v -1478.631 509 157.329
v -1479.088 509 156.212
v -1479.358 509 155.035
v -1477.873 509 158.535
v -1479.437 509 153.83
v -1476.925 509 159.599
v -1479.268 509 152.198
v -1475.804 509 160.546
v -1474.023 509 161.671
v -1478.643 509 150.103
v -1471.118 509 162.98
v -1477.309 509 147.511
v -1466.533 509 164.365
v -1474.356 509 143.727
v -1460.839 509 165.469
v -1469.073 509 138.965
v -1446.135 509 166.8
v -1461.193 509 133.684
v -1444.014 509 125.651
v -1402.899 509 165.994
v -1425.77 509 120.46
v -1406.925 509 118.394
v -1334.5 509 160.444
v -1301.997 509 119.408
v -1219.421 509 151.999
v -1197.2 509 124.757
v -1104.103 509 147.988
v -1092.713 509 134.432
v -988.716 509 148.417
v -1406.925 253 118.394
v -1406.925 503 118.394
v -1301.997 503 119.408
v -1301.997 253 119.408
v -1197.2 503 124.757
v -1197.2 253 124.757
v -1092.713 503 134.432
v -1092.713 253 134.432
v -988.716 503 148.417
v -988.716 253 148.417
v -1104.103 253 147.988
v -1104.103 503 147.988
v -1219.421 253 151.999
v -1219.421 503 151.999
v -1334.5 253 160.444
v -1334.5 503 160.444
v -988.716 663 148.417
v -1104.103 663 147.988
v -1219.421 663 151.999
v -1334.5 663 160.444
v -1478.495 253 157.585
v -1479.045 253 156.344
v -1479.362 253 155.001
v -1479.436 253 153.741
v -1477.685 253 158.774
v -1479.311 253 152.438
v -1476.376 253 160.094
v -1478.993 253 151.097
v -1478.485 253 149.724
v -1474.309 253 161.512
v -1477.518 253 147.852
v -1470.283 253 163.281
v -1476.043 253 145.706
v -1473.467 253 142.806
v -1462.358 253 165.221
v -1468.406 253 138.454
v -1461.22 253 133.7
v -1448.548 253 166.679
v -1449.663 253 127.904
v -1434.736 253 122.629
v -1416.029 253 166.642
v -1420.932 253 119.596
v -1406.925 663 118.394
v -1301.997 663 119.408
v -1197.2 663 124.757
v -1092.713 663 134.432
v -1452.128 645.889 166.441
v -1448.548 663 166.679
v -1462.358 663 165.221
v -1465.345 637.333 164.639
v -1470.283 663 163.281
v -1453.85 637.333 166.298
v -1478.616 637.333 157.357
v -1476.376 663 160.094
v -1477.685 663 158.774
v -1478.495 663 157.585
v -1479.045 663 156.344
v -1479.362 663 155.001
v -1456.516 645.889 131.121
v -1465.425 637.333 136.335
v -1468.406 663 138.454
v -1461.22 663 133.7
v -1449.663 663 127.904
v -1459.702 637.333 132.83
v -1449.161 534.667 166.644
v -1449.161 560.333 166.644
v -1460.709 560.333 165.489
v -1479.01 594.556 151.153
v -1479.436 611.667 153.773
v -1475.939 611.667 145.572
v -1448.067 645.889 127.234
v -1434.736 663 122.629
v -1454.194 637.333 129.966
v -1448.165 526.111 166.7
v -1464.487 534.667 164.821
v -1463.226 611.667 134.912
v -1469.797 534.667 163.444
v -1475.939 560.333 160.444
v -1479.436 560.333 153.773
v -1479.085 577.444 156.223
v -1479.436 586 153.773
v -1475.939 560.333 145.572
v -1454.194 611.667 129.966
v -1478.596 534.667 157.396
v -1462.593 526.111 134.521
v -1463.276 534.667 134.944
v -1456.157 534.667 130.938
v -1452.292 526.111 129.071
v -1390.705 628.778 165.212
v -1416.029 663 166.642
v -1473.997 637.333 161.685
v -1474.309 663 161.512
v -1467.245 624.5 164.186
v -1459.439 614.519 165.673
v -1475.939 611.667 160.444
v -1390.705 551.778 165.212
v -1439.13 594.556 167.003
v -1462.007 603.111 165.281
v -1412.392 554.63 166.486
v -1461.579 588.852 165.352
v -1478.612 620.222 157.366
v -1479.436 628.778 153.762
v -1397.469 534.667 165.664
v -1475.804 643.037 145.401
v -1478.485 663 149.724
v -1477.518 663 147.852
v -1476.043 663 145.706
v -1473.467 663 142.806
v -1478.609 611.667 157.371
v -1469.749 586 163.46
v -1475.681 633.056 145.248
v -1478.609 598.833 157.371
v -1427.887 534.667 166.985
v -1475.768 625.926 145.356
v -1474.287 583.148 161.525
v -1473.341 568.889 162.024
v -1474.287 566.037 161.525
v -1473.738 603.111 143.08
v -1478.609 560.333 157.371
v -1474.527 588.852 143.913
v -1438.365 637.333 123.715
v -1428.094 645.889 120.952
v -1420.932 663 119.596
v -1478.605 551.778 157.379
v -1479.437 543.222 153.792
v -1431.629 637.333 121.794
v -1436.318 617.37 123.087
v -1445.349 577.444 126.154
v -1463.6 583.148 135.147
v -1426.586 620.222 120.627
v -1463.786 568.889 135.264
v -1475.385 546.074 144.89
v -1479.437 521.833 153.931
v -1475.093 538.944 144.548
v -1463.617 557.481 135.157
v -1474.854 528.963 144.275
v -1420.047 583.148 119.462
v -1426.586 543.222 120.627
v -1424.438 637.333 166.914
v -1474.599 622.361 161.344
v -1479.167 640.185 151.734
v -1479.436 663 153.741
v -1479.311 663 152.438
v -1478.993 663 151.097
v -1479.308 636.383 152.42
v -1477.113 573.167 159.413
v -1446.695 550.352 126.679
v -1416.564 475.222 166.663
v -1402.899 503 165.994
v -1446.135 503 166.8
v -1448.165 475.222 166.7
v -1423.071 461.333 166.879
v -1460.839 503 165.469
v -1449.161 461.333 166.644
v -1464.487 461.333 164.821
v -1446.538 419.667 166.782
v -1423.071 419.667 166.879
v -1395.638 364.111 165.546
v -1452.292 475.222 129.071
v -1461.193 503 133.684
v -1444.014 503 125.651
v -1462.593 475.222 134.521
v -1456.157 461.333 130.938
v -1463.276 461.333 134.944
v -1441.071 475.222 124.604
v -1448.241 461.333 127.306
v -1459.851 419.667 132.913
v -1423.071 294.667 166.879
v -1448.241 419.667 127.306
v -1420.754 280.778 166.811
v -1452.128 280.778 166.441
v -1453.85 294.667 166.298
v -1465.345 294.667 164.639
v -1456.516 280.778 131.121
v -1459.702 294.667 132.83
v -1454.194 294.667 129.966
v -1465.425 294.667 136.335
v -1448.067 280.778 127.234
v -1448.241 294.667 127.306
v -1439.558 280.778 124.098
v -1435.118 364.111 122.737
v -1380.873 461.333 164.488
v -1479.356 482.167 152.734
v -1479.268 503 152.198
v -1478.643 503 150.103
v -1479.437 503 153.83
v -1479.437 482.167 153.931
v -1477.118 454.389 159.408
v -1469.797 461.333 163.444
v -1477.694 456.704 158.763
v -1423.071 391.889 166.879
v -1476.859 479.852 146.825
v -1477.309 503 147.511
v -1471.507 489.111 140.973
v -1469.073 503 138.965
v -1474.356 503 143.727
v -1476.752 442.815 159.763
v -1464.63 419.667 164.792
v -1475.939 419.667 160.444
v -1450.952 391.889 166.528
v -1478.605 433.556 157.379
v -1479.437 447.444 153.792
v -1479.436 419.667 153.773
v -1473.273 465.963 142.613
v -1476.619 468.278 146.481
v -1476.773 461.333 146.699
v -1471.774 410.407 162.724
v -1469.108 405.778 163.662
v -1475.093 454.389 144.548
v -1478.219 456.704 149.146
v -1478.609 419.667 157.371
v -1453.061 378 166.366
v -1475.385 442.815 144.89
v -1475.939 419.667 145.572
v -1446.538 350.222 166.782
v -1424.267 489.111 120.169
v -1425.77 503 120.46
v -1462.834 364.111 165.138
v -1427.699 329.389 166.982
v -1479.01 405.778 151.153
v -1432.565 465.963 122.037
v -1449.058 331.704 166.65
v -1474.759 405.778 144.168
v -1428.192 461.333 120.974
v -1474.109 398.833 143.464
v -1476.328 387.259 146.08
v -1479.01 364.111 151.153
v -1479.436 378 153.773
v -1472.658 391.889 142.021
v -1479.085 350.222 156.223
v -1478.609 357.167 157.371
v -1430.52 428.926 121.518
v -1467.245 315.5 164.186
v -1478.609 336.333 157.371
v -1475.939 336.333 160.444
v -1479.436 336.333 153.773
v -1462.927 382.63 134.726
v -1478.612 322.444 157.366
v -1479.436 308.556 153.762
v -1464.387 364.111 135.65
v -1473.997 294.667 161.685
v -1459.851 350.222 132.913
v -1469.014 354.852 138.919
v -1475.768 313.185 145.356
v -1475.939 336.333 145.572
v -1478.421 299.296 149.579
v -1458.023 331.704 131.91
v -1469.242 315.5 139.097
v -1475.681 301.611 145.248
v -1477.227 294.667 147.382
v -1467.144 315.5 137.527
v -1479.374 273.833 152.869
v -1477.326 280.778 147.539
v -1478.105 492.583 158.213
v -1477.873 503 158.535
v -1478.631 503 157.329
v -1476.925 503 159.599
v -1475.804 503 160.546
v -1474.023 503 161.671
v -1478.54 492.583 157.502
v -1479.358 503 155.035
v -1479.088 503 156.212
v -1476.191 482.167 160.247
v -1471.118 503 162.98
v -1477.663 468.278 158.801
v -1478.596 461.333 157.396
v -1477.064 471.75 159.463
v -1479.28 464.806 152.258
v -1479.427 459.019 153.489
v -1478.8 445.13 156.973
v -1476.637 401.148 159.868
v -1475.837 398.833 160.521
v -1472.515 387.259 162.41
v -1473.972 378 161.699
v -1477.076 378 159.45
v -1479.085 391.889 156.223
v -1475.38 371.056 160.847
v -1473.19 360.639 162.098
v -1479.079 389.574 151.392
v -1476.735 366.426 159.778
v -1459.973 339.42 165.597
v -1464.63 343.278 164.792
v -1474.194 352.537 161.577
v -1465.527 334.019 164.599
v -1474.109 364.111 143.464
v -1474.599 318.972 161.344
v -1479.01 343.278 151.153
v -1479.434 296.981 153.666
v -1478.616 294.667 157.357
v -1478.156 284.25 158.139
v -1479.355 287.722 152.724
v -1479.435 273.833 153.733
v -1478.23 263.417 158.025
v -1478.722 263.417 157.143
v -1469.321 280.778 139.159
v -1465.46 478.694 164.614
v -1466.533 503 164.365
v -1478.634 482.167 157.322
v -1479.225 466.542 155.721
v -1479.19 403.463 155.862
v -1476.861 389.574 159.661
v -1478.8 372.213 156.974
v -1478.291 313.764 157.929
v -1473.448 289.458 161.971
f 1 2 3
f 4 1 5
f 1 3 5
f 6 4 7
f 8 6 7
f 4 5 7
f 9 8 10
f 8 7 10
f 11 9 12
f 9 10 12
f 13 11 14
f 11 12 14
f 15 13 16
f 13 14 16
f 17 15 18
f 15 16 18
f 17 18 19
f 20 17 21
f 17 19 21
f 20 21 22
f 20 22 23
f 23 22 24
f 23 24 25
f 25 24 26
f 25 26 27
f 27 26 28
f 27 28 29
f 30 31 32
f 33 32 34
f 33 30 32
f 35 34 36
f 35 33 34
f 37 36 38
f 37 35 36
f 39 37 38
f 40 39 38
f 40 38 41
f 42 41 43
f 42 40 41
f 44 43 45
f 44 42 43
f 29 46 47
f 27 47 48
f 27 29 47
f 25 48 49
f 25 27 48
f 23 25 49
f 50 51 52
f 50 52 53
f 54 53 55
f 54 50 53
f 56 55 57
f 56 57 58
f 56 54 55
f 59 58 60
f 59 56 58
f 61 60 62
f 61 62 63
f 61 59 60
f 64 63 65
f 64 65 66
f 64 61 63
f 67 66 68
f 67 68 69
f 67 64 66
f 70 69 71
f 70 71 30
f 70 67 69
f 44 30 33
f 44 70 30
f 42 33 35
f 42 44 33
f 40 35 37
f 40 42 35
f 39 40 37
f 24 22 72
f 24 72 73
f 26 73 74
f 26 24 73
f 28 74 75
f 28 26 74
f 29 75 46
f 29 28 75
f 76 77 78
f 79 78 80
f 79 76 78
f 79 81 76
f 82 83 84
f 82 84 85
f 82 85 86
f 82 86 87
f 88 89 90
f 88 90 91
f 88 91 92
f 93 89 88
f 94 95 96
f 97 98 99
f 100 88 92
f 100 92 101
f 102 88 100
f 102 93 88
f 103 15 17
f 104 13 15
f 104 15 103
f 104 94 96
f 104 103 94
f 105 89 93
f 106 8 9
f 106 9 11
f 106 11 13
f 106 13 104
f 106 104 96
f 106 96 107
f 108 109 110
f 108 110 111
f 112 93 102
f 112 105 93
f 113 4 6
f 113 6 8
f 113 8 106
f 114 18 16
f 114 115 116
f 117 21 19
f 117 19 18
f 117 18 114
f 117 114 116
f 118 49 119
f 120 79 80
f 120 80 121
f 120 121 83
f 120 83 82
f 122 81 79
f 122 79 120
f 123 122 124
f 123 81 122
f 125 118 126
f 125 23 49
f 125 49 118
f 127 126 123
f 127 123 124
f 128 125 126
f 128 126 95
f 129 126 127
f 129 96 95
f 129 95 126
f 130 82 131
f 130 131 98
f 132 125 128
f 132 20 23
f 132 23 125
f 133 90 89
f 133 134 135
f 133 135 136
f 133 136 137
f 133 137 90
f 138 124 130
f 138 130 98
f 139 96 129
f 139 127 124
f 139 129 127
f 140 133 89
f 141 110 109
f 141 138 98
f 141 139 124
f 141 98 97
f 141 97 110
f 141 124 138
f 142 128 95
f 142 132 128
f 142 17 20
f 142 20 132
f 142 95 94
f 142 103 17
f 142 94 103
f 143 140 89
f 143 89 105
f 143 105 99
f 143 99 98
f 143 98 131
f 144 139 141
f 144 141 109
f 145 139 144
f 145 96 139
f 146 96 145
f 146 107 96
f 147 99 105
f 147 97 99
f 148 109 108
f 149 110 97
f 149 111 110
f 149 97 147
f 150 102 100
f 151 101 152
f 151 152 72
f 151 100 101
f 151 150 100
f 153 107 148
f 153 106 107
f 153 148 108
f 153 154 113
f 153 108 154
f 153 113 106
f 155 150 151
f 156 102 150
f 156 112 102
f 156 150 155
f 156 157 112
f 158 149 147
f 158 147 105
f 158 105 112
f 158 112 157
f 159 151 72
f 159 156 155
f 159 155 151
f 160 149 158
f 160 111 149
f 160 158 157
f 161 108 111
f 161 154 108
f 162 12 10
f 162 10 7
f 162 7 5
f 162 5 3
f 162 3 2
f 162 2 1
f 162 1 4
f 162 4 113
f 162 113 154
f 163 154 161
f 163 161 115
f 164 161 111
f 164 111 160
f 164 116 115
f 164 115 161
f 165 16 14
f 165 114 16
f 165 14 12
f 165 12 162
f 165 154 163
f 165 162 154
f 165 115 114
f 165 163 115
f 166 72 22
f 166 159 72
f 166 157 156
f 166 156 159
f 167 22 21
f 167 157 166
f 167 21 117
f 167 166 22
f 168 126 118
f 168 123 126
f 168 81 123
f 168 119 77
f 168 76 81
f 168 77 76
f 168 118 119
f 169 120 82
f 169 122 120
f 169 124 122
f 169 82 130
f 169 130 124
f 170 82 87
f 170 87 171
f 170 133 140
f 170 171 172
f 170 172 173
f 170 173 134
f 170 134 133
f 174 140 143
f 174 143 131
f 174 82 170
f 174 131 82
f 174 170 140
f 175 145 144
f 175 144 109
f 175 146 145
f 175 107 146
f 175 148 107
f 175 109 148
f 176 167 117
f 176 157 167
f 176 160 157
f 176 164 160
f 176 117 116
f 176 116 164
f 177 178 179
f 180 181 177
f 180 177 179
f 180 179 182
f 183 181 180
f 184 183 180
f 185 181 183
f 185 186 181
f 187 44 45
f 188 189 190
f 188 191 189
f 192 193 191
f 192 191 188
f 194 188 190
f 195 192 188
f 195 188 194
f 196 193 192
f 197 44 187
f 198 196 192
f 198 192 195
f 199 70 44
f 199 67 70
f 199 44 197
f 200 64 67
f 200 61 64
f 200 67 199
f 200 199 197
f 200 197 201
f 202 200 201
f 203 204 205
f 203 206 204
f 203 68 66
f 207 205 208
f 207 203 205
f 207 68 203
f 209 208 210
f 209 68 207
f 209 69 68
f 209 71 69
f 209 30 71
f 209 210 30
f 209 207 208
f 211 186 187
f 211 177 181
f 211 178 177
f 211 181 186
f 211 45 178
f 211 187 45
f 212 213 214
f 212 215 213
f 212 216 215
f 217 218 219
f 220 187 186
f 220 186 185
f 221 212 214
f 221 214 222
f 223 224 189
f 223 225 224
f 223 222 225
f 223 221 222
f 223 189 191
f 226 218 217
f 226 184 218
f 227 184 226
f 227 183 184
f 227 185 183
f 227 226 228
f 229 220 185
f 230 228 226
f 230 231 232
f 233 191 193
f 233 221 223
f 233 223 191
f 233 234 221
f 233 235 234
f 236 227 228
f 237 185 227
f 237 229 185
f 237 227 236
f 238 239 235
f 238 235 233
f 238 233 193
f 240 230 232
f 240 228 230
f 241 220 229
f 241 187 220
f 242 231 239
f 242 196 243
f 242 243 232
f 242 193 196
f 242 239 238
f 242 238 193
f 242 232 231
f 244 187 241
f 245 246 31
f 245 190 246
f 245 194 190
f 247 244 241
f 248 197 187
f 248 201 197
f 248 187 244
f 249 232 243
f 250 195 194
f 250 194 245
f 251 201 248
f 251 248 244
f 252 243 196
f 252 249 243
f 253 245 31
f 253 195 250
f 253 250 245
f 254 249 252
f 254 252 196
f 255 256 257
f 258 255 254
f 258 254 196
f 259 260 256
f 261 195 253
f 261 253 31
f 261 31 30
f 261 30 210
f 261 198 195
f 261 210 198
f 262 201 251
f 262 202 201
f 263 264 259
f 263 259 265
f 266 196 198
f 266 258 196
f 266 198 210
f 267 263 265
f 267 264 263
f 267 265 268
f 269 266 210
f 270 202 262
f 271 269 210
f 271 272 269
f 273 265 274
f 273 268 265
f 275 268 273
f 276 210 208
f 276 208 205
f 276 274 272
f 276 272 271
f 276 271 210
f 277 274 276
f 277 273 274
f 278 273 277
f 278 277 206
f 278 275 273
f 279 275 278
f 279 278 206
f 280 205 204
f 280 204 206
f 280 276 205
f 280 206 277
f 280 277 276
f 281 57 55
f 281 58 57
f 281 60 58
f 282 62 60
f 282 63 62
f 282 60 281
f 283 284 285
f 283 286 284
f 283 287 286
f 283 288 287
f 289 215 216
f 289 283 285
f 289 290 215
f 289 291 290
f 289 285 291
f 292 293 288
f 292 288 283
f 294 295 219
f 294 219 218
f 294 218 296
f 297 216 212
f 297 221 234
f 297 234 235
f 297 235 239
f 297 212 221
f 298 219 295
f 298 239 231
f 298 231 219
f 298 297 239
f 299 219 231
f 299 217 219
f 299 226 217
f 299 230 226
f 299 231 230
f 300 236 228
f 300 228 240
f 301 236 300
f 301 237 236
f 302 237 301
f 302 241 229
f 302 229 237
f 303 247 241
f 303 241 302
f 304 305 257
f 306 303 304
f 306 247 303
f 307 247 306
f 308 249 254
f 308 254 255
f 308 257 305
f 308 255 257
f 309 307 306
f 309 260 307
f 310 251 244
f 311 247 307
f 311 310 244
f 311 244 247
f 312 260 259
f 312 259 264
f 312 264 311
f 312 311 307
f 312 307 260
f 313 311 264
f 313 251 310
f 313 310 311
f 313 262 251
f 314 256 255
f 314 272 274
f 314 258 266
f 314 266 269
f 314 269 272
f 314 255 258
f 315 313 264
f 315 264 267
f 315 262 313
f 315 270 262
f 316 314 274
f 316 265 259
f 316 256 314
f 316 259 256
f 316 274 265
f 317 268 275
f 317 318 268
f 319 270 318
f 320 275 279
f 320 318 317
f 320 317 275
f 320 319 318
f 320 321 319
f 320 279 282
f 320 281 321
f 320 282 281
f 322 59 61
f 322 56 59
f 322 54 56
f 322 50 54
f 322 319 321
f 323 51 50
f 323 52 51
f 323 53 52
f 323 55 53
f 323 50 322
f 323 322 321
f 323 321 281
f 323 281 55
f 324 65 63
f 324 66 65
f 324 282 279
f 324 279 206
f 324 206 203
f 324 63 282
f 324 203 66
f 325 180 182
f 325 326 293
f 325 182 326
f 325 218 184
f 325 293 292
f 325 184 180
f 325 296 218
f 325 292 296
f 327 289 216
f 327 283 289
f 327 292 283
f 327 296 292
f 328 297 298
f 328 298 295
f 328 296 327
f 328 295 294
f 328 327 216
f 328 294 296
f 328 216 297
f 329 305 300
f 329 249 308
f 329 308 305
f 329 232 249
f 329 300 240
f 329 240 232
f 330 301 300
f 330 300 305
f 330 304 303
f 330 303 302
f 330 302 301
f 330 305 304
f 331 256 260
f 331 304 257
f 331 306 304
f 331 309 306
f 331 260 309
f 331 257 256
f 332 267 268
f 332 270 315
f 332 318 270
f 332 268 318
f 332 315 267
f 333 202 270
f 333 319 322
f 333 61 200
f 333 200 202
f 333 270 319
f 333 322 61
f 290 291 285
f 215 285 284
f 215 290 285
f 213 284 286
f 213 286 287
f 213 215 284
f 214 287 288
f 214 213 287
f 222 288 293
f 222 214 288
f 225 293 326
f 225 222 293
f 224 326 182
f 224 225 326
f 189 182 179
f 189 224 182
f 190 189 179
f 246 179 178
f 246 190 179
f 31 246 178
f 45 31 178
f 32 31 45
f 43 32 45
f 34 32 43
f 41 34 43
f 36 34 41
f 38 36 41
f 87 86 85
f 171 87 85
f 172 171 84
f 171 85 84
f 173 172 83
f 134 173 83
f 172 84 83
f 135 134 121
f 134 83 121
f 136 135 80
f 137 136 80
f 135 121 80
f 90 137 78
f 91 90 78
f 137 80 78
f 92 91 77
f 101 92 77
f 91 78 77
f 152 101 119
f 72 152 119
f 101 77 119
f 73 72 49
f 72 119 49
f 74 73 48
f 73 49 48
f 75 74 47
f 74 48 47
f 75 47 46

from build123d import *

# Parameters (mm, degrees)
F2_DEPTH = 410
F3_W     = 1559.3330264091
F3_H     = 6
F4_DEPTH = 167.0408719674


with BuildPart() as f2:
    # F1 (on offset) → F2 (new body)
    with BuildSketch(Plane.XZ.offset(-253)):
        with BuildLine():
            ThreePointArc((-988.716, 148.417), (-1161.7816364548, 149.4383400359), (-1334.5, 160.444))
            add(Edge.make_bspline(
                [(-1334.5, 160.444), (-1397.0024748407, 166.242066134), (-1481.8062211749, 173.6092407555), (-1479.6835086501, 139.0946427224), (-1435.1203538419, 118.704540329), (-1406.925201416, 118.39415133)],
                knots=[0, 0, 0, 0, 0.4881791658, 0.646478592, 1, 1, 1, 1], degree=3))
            ThreePointArc((-1406.925201416, 118.39415133), (-1197.1997177342, 124.7568636289), (-988.716, 148.417))
        make_face()
    extrude(amount=-F2_DEPTH)

    # F3 (on Top) → F4 (cut, through all)
    with BuildSketch(Plane.XY):
        with Locations((-930.7109415531, 506)):
            Rectangle(F3_W, F3_H)
    extrude(amount=F4_DEPTH, mode=Mode.SUBTRACT)


solid = f2.part
